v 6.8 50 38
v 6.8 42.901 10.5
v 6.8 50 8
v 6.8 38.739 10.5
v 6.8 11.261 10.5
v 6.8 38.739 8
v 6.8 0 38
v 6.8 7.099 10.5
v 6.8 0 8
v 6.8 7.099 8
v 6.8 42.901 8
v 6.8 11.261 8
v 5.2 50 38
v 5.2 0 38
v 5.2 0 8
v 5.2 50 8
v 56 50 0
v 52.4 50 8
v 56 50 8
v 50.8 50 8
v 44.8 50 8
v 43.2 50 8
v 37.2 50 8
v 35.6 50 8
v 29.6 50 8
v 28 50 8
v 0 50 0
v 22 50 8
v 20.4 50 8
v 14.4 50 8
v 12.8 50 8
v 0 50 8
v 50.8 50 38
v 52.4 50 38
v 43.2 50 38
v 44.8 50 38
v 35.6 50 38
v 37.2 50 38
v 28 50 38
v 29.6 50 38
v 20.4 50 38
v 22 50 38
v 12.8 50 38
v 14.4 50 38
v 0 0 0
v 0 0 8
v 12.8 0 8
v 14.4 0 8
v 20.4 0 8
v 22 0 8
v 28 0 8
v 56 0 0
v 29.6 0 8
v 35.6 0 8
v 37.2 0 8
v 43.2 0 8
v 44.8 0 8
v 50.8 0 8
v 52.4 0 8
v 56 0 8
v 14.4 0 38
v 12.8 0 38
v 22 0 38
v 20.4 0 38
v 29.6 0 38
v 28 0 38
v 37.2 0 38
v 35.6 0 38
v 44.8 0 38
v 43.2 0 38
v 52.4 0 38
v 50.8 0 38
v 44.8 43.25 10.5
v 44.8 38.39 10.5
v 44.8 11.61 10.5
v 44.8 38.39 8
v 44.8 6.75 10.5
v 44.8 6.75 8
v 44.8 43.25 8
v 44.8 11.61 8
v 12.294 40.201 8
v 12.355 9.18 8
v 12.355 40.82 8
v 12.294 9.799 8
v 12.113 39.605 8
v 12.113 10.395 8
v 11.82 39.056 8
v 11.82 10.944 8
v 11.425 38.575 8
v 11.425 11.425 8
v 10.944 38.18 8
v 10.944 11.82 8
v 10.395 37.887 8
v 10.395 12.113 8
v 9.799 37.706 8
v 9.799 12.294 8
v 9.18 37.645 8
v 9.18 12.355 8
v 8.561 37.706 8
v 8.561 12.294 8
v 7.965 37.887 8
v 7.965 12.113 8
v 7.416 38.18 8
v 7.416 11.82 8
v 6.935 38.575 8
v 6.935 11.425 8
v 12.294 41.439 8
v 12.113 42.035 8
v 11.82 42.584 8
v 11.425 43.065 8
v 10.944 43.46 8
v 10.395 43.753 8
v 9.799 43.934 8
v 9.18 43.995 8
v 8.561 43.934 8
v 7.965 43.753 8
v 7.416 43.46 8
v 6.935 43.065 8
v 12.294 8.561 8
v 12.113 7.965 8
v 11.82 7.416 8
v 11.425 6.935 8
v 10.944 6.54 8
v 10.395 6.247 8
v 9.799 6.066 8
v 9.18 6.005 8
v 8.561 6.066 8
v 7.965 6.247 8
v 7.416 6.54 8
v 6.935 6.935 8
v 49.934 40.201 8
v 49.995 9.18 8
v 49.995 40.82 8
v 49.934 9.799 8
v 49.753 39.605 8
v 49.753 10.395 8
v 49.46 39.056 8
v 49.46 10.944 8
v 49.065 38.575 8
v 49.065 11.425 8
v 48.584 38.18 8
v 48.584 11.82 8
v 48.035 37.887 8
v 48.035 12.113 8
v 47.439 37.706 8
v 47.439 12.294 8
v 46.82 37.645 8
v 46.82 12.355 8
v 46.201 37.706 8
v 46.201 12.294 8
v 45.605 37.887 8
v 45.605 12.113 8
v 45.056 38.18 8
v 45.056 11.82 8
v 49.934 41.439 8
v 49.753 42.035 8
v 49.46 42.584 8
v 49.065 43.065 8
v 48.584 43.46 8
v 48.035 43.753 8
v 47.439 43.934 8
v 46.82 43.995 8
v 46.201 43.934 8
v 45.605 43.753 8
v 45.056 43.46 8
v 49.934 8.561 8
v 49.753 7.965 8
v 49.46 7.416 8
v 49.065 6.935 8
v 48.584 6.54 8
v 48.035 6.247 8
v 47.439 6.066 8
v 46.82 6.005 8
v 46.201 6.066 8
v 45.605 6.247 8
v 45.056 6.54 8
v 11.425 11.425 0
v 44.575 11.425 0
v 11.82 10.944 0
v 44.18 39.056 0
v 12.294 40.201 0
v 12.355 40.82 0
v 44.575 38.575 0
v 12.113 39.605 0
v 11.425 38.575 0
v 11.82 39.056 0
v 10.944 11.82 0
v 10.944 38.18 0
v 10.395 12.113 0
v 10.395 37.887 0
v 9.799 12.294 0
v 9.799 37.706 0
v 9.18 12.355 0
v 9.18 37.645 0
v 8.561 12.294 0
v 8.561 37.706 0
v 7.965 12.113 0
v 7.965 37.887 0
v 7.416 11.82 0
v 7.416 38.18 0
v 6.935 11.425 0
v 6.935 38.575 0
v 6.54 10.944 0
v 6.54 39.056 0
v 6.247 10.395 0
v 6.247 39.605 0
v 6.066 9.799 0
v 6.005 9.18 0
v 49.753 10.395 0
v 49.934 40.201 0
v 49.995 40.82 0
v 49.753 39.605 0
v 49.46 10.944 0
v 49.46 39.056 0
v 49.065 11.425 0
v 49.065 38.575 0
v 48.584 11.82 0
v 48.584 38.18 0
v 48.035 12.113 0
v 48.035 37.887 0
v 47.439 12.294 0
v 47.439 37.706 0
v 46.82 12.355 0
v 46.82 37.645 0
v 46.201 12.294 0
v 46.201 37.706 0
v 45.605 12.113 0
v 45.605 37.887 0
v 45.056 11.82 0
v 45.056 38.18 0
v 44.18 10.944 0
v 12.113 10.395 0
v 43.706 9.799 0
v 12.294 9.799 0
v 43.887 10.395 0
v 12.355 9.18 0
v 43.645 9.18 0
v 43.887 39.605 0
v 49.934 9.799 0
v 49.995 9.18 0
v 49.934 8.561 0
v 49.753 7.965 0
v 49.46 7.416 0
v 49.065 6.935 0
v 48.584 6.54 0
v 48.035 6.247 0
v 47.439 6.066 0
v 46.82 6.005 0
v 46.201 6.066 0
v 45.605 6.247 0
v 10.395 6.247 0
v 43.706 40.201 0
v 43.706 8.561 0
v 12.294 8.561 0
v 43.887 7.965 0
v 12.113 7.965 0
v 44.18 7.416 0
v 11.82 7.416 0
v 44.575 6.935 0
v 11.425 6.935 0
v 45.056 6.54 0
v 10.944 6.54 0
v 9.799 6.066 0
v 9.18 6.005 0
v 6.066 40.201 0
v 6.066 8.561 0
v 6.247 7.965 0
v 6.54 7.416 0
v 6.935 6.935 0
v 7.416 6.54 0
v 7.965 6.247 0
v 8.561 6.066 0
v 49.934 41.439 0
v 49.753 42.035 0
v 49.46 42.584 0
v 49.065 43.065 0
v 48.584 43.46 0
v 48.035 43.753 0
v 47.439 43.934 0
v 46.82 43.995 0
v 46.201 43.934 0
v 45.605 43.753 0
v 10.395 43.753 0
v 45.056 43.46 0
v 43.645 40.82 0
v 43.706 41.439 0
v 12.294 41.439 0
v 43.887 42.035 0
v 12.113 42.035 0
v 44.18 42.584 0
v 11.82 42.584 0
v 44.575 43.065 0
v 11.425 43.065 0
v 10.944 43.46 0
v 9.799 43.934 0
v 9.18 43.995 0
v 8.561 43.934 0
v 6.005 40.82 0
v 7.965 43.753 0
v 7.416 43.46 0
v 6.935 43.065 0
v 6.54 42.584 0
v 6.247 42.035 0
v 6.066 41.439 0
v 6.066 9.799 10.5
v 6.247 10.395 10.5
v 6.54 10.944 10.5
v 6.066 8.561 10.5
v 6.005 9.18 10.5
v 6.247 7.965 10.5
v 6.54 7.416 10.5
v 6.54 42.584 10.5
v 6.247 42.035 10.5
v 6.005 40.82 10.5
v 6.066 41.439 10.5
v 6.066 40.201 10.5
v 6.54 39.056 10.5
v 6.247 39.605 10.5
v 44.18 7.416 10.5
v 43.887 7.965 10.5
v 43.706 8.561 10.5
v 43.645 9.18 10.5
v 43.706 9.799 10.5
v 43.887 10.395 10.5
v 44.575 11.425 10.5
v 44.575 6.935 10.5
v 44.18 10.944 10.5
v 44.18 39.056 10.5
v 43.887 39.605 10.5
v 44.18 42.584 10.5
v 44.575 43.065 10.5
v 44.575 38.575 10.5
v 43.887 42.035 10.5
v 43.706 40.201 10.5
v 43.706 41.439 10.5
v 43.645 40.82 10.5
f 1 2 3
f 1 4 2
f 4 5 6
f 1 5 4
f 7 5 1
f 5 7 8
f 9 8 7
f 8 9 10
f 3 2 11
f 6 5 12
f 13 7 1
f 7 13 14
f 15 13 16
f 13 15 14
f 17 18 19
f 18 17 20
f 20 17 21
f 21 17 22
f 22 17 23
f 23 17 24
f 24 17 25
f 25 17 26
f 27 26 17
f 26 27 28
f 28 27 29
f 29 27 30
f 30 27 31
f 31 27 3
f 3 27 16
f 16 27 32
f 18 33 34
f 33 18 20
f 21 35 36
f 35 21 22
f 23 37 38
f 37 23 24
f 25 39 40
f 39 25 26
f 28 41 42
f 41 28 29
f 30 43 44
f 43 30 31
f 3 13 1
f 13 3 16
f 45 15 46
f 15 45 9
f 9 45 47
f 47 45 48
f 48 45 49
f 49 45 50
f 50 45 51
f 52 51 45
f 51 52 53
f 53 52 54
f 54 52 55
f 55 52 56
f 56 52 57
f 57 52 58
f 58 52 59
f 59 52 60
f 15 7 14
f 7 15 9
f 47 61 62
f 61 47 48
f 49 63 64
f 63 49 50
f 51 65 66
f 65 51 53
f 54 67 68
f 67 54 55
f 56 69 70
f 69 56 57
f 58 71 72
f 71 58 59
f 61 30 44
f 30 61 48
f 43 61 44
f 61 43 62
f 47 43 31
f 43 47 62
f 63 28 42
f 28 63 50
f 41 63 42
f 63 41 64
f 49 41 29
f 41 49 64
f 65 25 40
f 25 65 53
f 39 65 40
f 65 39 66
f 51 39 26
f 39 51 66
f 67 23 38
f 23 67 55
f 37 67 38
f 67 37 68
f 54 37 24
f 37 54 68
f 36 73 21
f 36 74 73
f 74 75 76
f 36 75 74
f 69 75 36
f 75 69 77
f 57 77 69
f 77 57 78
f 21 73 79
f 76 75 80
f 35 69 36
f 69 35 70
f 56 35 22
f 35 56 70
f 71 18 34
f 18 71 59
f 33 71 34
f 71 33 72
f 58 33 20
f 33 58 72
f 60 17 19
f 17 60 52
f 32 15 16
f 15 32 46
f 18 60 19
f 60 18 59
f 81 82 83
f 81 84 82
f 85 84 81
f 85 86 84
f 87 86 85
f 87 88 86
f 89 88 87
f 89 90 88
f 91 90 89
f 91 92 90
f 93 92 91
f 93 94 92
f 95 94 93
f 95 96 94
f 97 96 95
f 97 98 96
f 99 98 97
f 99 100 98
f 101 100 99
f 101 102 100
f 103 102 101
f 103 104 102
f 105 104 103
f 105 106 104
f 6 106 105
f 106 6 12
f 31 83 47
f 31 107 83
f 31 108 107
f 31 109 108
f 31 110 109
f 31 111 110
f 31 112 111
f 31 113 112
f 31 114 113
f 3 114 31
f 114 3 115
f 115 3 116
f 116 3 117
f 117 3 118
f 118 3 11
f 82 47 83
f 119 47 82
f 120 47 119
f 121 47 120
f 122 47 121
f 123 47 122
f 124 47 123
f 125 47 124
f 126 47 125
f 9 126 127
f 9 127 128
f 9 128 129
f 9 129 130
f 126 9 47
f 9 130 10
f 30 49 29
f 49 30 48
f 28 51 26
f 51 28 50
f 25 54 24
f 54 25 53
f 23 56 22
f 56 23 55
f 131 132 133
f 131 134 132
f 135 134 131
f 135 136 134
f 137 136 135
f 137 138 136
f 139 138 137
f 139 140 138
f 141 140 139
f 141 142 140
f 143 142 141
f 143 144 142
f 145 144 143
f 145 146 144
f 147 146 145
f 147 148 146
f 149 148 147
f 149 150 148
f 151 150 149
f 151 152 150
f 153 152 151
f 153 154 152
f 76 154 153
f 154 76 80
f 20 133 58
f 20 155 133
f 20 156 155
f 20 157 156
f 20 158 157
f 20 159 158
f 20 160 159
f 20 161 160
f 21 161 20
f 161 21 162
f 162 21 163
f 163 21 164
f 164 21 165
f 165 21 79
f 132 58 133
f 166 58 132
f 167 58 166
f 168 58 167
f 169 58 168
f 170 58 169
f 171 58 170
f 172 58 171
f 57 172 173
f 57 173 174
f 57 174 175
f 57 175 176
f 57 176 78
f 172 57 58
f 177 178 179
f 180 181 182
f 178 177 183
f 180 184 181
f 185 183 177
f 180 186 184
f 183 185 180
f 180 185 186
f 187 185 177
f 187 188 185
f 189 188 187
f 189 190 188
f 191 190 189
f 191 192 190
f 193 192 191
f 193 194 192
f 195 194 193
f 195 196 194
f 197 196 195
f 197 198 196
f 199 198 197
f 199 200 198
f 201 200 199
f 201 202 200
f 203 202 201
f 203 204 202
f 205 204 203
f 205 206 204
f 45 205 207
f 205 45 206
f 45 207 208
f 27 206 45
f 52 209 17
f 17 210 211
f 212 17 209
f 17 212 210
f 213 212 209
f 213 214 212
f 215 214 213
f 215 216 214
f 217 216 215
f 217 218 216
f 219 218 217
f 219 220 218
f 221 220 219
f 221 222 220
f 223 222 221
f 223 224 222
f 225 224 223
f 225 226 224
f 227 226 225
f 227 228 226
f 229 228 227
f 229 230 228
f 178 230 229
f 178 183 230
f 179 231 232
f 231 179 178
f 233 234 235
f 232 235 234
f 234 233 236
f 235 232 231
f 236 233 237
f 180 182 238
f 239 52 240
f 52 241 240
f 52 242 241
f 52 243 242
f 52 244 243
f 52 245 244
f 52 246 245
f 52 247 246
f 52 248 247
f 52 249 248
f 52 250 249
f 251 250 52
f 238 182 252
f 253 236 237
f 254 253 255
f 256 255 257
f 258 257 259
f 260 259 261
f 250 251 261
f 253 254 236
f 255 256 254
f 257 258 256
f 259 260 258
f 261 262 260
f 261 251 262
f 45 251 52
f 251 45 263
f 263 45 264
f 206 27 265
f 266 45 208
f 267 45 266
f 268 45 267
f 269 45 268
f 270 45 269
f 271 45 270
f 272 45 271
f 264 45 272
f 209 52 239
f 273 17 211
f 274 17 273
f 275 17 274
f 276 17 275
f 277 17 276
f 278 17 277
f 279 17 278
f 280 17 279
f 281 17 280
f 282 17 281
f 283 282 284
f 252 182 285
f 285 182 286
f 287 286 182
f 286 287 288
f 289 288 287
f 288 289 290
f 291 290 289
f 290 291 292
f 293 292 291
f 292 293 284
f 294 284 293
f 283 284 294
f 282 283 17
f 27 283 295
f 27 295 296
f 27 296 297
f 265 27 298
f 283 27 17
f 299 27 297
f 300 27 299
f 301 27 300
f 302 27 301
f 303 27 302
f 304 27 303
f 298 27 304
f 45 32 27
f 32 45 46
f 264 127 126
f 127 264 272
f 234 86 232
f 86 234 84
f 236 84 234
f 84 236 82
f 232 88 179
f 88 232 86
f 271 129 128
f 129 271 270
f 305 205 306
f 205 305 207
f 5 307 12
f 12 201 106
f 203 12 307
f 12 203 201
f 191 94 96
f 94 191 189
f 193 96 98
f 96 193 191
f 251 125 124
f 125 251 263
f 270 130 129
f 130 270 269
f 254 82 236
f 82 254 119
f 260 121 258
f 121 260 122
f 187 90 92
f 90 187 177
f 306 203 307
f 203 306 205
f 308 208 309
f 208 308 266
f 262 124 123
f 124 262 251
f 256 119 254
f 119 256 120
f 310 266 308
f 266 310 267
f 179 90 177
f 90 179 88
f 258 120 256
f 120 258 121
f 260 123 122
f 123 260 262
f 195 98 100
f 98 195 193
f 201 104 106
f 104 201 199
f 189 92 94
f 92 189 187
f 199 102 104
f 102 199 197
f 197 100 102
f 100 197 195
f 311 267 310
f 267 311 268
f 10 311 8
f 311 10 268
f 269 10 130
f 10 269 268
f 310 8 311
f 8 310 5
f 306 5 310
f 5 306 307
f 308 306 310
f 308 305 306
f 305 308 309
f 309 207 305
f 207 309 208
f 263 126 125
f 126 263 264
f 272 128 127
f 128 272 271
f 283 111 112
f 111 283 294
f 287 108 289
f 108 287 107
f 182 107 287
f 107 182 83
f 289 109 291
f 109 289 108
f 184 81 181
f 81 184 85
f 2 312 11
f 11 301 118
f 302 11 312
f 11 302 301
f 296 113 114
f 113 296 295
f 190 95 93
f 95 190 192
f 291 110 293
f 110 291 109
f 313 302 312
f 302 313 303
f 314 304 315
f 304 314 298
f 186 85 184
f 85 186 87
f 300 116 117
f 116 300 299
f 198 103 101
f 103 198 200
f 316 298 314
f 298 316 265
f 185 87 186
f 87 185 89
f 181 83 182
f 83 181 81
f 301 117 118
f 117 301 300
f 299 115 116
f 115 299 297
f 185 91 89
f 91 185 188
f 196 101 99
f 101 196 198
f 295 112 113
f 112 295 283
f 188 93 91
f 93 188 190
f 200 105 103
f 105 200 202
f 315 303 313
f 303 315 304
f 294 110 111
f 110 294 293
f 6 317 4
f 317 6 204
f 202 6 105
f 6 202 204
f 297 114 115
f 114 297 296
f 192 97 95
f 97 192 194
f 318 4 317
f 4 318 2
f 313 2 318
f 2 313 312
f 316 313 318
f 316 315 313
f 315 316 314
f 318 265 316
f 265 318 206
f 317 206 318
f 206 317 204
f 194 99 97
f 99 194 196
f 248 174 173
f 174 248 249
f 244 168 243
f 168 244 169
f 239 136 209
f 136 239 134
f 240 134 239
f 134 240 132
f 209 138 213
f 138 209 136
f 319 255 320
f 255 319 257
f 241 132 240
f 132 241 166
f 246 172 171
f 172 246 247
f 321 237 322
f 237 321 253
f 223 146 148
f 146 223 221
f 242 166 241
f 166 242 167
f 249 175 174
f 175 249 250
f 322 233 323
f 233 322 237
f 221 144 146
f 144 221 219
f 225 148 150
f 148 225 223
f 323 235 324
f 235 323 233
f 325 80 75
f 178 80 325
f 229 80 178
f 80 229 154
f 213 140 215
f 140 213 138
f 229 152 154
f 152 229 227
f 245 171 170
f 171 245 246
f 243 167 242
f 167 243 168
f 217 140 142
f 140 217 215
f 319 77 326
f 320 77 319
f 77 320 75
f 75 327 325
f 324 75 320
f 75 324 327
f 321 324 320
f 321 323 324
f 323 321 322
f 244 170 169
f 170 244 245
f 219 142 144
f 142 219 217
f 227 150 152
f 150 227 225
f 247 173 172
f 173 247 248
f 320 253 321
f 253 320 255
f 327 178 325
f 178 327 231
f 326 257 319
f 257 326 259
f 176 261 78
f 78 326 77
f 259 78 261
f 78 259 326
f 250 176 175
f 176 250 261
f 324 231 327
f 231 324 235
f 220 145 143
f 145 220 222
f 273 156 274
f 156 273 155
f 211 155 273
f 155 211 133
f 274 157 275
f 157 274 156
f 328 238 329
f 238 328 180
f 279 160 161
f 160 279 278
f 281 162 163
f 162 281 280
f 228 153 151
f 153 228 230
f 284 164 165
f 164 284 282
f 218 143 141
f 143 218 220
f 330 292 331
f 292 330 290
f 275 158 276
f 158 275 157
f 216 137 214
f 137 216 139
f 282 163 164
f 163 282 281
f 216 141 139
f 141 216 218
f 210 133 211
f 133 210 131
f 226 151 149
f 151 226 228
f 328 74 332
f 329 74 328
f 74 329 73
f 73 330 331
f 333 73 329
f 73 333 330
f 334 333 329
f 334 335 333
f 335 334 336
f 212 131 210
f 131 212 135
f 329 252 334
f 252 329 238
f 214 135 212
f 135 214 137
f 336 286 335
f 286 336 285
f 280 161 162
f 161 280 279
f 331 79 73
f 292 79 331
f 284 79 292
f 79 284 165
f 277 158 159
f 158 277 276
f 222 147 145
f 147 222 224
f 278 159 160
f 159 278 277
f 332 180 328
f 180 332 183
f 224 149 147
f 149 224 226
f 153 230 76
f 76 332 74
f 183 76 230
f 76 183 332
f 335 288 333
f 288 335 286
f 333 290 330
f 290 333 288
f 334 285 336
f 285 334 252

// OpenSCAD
$fn = 32;

// ----------------------------------------------------------------------
// Finned heat sink: 56 x 50 mm base, 30 mm fins
// ----------------------------------------------------------------------

// --- parameters (mm) ---
base_w = 56;              // base width
base_d = 50;              // base depth
base_t = 8;               // base thickness
fin_h = 30;               // fin height above the base
holes_d = 6.35;           // fixing holes
hole_x = 18.82;           // hole offset in x
hole_y = 15.82;           // hole offset in y
fin_t = 1.6;              // fin thickness
fin_pitch = 7.6;          // fin pitch
fin_count = 7;            // number of fins
fin_x0 = 5.2;             // first fin offset

difference() {
  union() {
    cube([base_w, base_d, base_t]);
    for (i = [0 : fin_count - 1]) {
      translate([fin_x0 + i * fin_pitch, 0, base_t - 0.5]) cube([fin_t, base_d, fin_h + 0.5]);
    }
  }
  /* fixing holes through the base, 2.5 mm clear on both sides */
  for (hx = [-18.82, 18.82]) {
    for (hy = [-15.82, 15.82]) {
      translate([base_w / 2 + hx, base_d / 2 + hy, -2.5]) cylinder(h = base_t + 5, d = holes_d);
    }
  }
}
